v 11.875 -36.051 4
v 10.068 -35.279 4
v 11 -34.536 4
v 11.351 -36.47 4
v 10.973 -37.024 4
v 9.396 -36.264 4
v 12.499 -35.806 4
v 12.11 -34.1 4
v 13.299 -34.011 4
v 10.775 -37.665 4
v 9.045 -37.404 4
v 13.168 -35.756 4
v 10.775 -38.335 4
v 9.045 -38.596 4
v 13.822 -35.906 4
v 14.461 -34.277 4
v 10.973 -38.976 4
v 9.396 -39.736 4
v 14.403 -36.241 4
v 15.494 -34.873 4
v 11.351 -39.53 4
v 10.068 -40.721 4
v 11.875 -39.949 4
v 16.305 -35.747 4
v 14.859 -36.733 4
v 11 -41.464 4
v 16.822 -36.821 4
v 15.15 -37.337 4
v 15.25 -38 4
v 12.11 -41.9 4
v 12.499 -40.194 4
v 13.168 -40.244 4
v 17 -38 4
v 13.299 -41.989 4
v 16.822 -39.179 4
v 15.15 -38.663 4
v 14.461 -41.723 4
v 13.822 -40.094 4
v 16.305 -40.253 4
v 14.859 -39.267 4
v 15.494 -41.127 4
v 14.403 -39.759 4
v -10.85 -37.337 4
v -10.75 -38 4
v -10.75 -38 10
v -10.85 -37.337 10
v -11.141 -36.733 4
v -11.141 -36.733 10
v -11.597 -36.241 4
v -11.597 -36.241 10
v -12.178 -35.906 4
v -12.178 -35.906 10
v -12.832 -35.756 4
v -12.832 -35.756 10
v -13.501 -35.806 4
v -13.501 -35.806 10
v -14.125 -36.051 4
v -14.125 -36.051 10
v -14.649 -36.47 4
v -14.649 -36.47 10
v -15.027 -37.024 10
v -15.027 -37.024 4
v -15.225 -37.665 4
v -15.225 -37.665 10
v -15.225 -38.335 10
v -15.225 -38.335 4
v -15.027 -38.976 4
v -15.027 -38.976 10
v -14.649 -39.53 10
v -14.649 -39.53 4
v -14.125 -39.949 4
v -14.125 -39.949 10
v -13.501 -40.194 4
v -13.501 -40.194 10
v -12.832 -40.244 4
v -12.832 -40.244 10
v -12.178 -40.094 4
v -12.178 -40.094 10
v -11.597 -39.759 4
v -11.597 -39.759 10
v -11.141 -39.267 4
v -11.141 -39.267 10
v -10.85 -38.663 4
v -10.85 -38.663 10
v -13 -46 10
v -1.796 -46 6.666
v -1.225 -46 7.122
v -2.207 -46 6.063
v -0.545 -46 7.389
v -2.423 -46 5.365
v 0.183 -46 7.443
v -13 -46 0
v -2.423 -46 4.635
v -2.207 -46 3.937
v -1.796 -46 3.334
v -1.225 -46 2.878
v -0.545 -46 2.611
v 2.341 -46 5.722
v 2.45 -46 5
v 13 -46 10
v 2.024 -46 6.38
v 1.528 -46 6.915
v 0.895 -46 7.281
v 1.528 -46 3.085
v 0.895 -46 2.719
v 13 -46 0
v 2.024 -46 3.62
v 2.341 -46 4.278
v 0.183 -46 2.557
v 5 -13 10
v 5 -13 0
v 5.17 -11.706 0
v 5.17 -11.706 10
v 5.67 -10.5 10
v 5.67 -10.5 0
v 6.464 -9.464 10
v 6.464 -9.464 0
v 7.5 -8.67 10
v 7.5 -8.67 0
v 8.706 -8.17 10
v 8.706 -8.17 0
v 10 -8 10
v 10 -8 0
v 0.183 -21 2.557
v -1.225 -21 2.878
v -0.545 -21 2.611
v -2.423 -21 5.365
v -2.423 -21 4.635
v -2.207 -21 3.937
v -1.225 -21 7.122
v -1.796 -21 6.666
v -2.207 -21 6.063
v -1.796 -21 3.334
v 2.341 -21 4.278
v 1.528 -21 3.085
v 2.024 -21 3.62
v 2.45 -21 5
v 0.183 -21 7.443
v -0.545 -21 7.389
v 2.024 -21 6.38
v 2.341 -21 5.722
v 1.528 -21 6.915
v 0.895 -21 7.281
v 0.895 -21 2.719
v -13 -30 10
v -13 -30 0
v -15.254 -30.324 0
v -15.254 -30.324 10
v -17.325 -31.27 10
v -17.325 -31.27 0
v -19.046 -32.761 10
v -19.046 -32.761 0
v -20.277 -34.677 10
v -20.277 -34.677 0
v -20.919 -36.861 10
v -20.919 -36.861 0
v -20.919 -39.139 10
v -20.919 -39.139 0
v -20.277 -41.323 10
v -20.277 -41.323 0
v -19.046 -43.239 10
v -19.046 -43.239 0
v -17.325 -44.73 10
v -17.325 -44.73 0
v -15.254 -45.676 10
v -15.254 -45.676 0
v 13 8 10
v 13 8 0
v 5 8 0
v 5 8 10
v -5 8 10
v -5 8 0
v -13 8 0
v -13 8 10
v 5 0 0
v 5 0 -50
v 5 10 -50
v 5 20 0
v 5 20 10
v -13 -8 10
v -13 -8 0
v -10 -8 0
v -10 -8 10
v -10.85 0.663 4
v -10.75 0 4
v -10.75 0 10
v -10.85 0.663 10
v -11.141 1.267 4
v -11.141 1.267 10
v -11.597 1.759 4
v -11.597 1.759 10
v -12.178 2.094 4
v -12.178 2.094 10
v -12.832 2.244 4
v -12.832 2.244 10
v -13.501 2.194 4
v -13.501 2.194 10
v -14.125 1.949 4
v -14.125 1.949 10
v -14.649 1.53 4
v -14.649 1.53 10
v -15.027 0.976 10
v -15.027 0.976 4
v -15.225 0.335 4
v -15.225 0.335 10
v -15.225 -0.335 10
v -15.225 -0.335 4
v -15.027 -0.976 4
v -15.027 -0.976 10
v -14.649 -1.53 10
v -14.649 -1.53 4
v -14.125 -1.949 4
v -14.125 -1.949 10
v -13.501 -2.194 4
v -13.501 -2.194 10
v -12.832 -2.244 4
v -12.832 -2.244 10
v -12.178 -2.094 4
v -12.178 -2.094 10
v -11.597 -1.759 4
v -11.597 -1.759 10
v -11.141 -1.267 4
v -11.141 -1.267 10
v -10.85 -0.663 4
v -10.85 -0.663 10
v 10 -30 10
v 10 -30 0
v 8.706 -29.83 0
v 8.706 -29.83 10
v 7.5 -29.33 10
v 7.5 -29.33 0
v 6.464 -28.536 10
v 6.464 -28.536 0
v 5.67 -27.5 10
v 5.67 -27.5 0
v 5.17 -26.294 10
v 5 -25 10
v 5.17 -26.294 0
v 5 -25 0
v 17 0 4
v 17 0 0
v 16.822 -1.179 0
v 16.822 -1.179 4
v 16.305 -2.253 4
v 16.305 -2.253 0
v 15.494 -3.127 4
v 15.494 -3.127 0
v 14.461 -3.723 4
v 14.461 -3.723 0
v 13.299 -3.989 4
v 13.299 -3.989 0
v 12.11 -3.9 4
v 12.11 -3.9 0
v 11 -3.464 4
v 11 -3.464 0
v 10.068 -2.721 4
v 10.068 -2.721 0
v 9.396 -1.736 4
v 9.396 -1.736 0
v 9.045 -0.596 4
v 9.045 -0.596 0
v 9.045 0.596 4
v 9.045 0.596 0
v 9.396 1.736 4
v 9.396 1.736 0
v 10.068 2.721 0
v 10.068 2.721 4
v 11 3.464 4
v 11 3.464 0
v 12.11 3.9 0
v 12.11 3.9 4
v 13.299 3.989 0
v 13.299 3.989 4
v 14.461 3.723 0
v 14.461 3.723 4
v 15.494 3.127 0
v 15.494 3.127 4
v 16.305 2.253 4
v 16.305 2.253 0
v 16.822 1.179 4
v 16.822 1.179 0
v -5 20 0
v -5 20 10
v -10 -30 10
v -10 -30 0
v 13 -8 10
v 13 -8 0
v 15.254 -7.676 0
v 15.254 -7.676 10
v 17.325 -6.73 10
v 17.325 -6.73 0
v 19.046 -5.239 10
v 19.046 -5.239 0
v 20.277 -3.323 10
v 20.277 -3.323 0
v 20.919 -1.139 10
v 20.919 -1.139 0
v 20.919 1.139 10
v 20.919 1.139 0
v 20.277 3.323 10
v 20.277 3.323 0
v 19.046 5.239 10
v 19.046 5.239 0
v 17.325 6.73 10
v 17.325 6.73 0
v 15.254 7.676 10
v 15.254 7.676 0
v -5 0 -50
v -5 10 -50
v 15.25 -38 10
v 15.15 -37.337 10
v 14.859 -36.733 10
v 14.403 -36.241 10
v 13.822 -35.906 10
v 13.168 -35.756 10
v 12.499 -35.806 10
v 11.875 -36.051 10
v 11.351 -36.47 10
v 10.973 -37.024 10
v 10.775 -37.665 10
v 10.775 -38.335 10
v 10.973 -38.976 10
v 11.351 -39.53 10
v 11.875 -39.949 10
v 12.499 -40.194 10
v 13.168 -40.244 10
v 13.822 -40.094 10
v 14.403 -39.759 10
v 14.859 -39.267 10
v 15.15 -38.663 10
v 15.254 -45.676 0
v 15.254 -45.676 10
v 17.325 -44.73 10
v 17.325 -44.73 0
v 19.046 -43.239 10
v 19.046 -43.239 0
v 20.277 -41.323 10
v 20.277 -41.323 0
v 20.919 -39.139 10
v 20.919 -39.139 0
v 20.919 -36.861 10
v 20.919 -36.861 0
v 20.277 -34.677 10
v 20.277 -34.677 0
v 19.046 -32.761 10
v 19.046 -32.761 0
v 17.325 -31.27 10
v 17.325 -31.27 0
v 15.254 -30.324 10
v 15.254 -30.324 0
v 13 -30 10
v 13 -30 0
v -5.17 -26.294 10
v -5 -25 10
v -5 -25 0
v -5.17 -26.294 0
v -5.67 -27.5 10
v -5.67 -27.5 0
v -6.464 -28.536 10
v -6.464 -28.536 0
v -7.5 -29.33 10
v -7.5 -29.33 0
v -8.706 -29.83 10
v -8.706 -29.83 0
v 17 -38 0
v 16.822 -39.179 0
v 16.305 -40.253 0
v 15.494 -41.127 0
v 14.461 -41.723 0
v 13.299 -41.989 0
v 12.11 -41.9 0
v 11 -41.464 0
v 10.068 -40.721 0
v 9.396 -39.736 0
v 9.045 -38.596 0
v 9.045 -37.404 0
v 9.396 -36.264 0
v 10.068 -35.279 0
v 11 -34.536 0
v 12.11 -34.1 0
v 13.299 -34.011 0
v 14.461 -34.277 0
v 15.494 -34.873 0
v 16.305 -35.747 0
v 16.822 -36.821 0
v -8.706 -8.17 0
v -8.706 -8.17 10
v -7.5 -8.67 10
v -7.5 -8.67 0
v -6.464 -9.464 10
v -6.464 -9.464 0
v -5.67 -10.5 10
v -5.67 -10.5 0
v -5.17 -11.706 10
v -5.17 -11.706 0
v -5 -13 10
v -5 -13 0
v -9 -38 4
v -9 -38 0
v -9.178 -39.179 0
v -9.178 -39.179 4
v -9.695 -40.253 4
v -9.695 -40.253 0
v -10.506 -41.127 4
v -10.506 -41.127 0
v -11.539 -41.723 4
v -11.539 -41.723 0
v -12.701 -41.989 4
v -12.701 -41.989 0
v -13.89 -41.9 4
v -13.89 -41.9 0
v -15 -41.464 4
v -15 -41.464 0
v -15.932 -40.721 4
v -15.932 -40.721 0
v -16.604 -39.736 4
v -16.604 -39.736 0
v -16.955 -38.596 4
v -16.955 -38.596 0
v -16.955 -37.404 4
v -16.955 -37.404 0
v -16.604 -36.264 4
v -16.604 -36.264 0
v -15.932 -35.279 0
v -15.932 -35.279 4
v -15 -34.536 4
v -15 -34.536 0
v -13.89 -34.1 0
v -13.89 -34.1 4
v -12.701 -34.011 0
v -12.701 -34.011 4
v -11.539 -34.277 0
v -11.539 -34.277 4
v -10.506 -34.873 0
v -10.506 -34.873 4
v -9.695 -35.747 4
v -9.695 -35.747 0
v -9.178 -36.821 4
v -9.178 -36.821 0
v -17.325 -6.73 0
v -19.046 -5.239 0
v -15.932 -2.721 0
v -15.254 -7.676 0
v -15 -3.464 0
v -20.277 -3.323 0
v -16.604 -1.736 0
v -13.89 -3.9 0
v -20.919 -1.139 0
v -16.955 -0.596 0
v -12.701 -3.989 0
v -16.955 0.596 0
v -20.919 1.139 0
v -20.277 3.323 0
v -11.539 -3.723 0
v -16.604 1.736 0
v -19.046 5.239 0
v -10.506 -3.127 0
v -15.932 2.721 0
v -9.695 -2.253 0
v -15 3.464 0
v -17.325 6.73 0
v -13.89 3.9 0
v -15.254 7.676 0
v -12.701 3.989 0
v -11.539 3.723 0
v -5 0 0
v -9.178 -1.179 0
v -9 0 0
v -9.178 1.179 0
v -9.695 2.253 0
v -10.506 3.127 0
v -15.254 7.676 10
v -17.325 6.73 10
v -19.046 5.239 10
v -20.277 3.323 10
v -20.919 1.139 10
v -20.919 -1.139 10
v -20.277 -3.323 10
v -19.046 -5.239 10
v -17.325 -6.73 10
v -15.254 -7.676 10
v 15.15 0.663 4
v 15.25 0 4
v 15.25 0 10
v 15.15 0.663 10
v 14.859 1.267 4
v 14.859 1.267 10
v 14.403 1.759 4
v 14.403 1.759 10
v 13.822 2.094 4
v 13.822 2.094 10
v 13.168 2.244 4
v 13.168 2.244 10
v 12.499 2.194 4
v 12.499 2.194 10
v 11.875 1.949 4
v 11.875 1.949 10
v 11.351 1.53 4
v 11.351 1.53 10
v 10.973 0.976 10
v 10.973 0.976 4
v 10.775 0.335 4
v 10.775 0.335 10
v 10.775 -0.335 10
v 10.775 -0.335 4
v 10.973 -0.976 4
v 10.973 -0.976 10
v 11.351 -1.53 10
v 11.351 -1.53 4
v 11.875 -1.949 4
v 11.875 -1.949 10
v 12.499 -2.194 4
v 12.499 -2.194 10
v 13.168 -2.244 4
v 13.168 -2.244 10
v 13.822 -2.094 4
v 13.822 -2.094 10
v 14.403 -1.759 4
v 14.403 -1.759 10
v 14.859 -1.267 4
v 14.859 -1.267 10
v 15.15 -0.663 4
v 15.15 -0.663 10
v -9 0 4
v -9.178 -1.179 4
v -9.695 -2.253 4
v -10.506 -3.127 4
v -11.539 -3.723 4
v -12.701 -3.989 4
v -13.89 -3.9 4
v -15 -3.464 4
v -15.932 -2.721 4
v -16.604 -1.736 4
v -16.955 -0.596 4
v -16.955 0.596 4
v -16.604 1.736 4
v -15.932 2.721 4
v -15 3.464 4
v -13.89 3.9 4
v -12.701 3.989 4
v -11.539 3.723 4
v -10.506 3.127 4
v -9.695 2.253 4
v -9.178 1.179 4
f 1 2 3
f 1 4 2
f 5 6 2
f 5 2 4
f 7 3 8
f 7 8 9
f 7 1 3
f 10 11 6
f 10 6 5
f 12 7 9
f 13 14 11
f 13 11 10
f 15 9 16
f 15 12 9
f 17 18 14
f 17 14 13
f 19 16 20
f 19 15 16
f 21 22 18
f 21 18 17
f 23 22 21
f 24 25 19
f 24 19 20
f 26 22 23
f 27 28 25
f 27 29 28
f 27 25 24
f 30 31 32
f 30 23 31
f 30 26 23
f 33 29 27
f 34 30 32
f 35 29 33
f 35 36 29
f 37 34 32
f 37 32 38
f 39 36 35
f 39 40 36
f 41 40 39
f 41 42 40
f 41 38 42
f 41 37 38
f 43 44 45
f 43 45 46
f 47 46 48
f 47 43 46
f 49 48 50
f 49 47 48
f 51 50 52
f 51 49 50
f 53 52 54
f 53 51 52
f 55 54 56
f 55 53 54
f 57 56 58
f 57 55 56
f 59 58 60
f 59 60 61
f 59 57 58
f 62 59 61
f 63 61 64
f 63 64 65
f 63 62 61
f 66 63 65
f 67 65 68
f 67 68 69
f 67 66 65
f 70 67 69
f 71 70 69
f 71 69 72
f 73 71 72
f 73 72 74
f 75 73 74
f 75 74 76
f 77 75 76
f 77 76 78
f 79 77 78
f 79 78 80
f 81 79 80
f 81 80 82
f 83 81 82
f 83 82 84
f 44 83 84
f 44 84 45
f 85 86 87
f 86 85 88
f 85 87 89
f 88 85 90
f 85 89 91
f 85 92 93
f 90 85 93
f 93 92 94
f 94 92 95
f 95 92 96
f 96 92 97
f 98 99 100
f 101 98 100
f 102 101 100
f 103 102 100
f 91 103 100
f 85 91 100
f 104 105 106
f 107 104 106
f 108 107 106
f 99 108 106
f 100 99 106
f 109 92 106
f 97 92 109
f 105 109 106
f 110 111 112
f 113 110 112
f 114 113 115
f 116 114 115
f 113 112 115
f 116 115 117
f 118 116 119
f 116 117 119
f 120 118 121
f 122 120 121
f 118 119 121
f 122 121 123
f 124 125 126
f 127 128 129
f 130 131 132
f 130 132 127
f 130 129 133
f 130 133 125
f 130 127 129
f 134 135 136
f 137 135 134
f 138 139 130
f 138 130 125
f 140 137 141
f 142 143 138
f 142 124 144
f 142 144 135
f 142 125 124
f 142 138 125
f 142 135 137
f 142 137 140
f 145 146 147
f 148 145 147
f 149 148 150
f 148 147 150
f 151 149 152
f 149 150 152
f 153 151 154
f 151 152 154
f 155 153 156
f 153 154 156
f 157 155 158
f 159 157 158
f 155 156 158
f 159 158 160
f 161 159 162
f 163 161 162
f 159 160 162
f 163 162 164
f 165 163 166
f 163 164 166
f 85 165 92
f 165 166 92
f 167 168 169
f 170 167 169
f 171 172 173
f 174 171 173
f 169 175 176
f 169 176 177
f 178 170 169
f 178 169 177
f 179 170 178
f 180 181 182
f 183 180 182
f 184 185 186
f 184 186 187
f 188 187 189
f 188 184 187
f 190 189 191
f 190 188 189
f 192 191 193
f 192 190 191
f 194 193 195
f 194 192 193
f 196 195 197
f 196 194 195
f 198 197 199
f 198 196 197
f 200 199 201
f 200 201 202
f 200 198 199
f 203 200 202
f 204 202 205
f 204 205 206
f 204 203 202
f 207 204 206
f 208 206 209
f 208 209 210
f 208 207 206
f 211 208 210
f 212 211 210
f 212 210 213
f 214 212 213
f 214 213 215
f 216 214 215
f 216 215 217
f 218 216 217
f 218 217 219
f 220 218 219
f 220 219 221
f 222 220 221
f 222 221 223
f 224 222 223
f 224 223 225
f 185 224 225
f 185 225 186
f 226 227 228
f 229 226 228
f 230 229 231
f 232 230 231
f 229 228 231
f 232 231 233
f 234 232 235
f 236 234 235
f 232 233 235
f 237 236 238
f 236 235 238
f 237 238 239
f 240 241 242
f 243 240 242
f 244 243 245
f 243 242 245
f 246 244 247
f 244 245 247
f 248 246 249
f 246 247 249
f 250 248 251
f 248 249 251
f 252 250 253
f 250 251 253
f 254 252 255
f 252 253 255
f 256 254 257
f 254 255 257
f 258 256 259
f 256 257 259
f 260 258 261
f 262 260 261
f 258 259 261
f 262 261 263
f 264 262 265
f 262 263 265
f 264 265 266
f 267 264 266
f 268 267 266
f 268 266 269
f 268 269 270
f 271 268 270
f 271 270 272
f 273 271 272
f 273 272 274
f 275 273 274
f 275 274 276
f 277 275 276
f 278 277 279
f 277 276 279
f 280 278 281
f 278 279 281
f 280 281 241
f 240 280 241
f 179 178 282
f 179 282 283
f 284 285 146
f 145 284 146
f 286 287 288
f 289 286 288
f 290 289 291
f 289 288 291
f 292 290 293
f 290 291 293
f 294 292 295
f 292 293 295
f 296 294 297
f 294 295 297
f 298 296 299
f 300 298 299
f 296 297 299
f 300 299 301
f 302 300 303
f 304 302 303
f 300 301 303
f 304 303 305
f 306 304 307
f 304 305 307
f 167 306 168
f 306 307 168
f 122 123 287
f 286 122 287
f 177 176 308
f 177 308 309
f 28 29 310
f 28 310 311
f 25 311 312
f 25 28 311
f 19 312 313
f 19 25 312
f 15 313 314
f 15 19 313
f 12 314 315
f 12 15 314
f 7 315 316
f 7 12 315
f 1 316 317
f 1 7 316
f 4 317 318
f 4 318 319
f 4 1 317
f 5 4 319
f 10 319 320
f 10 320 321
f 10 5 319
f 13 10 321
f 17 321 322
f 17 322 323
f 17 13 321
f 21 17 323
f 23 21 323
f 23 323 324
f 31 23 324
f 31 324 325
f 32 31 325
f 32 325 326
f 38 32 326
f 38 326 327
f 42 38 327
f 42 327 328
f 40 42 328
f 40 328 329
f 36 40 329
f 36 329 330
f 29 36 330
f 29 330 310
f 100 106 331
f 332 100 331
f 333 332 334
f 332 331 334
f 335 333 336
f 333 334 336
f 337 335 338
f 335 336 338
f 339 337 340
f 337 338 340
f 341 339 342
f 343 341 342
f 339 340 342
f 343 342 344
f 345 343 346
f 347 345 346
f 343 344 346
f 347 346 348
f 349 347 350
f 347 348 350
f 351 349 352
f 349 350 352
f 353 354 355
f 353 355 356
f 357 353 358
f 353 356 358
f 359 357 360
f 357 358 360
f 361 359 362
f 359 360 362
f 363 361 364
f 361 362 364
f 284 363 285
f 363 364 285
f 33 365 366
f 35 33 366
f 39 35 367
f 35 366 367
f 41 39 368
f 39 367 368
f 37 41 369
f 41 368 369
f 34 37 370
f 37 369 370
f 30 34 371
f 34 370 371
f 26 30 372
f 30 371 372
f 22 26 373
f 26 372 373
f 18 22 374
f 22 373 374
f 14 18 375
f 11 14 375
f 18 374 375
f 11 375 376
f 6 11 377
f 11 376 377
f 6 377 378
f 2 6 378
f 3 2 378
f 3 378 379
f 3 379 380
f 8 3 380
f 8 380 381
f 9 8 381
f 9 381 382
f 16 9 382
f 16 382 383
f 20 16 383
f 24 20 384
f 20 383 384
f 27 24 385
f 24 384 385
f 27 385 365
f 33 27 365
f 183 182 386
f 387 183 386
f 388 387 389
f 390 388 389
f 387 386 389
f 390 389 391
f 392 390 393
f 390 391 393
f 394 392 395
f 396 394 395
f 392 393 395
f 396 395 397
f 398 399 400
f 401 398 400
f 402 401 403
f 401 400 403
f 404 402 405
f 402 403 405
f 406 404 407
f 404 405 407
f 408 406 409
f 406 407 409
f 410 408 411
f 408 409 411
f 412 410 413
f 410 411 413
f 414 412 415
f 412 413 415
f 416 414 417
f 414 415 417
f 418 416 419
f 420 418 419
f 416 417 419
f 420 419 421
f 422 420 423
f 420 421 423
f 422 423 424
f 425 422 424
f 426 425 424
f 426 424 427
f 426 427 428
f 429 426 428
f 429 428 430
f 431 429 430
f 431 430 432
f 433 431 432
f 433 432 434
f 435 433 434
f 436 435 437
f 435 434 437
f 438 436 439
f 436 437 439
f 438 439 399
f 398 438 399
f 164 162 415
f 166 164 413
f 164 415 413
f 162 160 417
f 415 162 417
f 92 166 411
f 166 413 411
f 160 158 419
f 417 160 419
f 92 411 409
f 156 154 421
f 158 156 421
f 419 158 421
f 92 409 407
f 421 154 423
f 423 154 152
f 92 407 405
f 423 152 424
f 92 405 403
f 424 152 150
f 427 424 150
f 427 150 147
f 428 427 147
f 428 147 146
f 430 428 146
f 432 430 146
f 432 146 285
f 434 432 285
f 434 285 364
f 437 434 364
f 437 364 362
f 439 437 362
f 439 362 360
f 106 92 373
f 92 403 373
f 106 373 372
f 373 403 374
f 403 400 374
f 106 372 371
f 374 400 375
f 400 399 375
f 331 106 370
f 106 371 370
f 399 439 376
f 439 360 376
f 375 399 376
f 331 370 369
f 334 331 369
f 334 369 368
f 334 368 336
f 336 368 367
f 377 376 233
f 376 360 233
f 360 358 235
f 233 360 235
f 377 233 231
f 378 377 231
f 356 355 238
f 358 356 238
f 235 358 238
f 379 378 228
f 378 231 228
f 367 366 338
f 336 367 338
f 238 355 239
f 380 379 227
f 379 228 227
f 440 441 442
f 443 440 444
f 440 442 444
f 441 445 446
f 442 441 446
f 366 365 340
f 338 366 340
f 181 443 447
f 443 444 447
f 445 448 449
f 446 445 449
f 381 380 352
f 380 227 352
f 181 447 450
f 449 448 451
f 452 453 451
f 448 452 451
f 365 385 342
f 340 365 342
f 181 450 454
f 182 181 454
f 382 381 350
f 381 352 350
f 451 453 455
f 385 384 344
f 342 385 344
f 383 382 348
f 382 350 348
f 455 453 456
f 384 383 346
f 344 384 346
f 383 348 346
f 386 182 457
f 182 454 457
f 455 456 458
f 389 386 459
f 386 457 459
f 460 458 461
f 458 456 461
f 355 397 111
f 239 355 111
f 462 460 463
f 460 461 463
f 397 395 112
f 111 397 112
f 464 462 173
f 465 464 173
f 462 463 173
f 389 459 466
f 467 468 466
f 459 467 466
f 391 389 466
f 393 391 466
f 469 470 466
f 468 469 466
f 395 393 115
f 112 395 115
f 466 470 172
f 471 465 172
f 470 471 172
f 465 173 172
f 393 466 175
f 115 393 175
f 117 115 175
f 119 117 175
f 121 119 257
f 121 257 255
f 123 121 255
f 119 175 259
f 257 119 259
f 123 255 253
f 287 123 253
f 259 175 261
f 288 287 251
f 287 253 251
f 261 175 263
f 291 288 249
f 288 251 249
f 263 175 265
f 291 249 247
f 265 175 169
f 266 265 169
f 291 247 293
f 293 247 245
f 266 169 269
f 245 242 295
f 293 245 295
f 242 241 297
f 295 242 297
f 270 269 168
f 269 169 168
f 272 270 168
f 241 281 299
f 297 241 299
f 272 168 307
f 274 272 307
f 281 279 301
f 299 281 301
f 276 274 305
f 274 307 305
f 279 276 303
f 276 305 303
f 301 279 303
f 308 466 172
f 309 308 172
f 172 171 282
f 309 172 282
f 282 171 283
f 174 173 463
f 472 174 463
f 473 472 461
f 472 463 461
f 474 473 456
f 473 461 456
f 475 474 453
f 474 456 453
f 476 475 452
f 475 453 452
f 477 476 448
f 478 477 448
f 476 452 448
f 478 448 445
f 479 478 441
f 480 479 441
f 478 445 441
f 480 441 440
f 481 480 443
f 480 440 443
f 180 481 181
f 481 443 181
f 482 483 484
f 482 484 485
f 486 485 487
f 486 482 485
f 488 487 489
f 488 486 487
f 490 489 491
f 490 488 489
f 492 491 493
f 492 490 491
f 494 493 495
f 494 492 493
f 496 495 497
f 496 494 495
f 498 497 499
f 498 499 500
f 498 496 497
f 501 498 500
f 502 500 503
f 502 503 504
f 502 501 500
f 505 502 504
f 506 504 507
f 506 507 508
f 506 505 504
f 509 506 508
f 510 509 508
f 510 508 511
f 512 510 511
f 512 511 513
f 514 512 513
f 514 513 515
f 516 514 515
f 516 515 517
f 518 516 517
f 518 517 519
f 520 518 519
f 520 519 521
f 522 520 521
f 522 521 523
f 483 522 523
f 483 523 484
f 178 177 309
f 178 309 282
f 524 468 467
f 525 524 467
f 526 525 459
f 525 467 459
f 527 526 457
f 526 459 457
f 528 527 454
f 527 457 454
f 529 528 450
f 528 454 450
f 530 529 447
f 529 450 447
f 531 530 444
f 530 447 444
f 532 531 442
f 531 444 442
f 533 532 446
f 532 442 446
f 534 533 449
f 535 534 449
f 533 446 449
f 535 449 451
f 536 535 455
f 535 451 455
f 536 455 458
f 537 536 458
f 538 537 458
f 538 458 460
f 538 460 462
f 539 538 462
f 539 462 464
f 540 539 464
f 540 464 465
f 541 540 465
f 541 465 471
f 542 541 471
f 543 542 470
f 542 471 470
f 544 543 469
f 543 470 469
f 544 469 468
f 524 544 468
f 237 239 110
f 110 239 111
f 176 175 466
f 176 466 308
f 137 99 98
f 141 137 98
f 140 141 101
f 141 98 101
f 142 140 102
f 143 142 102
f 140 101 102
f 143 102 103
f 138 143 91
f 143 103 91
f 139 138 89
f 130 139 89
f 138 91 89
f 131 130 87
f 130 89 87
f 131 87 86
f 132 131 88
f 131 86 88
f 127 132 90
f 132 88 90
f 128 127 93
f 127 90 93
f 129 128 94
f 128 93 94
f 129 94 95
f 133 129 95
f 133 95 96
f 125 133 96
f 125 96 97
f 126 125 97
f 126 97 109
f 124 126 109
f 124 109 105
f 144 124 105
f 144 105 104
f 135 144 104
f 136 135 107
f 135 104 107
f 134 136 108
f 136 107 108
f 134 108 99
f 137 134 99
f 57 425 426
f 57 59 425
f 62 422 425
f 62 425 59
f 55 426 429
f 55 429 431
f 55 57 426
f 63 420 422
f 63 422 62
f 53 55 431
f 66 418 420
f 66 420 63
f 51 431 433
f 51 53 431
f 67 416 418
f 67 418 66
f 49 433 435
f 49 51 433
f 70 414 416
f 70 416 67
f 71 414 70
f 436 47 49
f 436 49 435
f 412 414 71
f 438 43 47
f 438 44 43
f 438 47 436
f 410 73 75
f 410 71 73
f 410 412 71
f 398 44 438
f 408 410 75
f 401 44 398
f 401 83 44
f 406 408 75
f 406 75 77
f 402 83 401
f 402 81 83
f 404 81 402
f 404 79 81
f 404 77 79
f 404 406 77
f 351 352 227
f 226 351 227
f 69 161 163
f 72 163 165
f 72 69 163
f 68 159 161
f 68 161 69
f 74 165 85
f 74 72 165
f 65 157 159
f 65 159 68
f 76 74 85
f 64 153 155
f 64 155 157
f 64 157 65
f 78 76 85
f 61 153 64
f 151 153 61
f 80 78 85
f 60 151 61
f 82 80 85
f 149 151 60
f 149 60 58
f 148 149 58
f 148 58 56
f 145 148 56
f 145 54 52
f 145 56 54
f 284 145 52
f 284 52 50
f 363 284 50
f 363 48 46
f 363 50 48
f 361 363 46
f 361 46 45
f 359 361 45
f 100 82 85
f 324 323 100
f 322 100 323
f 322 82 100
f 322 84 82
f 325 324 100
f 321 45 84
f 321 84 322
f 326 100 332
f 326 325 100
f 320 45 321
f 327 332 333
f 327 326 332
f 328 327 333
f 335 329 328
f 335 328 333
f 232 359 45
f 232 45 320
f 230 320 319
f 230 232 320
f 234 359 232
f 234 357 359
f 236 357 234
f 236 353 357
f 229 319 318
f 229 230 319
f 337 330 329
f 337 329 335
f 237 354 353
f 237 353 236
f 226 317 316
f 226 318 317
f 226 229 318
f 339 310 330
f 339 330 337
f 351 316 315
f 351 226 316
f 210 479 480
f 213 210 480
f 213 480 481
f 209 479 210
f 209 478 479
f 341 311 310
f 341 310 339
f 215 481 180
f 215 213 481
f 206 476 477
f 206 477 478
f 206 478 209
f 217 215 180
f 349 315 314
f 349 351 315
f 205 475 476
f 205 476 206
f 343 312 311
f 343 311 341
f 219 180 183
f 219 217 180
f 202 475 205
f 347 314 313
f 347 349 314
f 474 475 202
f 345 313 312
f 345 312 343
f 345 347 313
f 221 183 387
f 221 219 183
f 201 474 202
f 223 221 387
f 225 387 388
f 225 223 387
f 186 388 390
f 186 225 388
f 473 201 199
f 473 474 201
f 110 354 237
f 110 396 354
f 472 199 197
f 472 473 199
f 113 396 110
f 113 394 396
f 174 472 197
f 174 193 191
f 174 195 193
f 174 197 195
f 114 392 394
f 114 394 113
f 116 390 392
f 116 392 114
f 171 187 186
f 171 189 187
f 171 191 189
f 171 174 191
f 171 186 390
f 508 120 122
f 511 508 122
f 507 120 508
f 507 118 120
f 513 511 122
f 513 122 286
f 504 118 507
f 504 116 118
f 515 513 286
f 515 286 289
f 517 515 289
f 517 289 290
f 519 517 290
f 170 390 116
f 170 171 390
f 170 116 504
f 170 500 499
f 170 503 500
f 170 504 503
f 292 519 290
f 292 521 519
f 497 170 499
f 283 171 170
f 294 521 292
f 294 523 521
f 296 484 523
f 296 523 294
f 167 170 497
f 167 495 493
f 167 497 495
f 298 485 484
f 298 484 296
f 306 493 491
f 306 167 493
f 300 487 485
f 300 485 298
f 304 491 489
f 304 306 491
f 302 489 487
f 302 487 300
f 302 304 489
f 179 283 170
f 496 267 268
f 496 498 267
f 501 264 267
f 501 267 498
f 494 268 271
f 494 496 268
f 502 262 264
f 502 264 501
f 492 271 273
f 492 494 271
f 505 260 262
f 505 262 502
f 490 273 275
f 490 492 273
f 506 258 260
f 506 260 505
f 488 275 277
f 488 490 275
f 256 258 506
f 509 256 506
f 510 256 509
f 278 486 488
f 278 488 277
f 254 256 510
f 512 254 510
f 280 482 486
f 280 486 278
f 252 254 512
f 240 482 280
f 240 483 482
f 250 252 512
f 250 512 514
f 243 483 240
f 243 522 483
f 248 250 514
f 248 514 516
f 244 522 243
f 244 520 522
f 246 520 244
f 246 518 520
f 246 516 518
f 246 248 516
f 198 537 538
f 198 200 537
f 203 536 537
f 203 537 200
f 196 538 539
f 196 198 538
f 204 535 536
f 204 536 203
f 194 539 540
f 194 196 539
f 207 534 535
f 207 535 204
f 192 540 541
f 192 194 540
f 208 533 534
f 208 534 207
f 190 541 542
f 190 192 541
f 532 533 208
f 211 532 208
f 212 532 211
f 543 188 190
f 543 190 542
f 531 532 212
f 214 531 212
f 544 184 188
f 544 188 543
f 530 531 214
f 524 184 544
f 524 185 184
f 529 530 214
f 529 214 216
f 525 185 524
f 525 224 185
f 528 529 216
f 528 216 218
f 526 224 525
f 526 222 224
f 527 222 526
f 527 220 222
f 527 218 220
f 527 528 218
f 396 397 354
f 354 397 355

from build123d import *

# Parameters (mm, degrees)
F0_R     = 2.25
F1_DEPTH = 10
F2_W     = 12
F2_H     = 10
F3_DEPTH = 10
F4_R     = 2.45
F5_DEPTH = 25
F6_R     = 4
F7_DEPTH = 4


with BuildPart() as f1:
    # F0 (on Top) → F1 (new body)
    with BuildSketch(Plane.XY):
        with BuildLine():
            Line((13, 8), (0, 8))
            Line((0, 8), (-13, 8))
            ThreePointArc((-13, 8), (-21, 0), (-13, -8))
            Line((-13, -8), (-10, -8))
            ThreePointArc((-10, -8), (-6.464466, -9.464466), (-5, -13))
            Line((-5, -13), (-5, -25))
            ThreePointArc((-5, -25), (-6.464466, -28.535534), (-10, -30))
            Line((-10, -30), (-13, -30))
            ThreePointArc((-13, -30), (-21, -38), (-13, -46))
            Line((-13, -46), (0, -46))
            Line((0, -46), (13, -46))
            ThreePointArc((13, -46), (21, -38), (13, -30))
            Line((13, -30), (10, -30))
            ThreePointArc((10, -30), (6.464466, -28.535534), (5, -25))
            Line((5, -25), (5, -13))
            ThreePointArc((5, -13), (6.464466, -9.464466), (10, -8))
            Line((10, -8), (13, -8))
            ThreePointArc((13, -8), (21, 0), (13, 8))
        make_face()
        with Locations((-13, -38)):
            Circle(F0_R, mode=Mode.SUBTRACT)
        with Locations((13, -38)):
            Circle(F0_R, mode=Mode.SUBTRACT)
        with Locations((-13, 0)):
            Circle(F0_R, mode=Mode.SUBTRACT)
        with Locations((13, 0)):
            Circle(F0_R, mode=Mode.SUBTRACT)
    extrude(amount=F1_DEPTH)

    # F2 (on face) → F3 (join)
    with BuildSketch(Plane.YZ.offset(5)):
        Polygon((8, 0), (0, 0), (0, -50), (10, -50), (20, 0), align=None)
        with Locations((14, 5)):
            Rectangle(F2_W, F2_H)
    extrude(amount=-F3_DEPTH)

    # F4 (on face) → F5 (cut)
    with BuildSketch(Plane.XZ.offset(46)):
        with Locations((0, 5)):
            Circle(F4_R)
    extrude(amount=-F5_DEPTH, mode=Mode.SUBTRACT)

    # F6 (on face) → F7 (cut)
    with BuildSketch(Plane(origin=(0, 0, 0), x_dir=(1, 0, 0), z_dir=(0, 0, -1))):
        with Locations((13, 0)):
            Circle(F6_R)
        with Locations((-13, 0)):
            Circle(F6_R)
        with Locations((-13, 38)):
            Circle(F6_R)
        with Locations((13, 38)):
            Circle(F6_R)
    extrude(amount=-F7_DEPTH, mode=Mode.SUBTRACT)


solid = f1.part
